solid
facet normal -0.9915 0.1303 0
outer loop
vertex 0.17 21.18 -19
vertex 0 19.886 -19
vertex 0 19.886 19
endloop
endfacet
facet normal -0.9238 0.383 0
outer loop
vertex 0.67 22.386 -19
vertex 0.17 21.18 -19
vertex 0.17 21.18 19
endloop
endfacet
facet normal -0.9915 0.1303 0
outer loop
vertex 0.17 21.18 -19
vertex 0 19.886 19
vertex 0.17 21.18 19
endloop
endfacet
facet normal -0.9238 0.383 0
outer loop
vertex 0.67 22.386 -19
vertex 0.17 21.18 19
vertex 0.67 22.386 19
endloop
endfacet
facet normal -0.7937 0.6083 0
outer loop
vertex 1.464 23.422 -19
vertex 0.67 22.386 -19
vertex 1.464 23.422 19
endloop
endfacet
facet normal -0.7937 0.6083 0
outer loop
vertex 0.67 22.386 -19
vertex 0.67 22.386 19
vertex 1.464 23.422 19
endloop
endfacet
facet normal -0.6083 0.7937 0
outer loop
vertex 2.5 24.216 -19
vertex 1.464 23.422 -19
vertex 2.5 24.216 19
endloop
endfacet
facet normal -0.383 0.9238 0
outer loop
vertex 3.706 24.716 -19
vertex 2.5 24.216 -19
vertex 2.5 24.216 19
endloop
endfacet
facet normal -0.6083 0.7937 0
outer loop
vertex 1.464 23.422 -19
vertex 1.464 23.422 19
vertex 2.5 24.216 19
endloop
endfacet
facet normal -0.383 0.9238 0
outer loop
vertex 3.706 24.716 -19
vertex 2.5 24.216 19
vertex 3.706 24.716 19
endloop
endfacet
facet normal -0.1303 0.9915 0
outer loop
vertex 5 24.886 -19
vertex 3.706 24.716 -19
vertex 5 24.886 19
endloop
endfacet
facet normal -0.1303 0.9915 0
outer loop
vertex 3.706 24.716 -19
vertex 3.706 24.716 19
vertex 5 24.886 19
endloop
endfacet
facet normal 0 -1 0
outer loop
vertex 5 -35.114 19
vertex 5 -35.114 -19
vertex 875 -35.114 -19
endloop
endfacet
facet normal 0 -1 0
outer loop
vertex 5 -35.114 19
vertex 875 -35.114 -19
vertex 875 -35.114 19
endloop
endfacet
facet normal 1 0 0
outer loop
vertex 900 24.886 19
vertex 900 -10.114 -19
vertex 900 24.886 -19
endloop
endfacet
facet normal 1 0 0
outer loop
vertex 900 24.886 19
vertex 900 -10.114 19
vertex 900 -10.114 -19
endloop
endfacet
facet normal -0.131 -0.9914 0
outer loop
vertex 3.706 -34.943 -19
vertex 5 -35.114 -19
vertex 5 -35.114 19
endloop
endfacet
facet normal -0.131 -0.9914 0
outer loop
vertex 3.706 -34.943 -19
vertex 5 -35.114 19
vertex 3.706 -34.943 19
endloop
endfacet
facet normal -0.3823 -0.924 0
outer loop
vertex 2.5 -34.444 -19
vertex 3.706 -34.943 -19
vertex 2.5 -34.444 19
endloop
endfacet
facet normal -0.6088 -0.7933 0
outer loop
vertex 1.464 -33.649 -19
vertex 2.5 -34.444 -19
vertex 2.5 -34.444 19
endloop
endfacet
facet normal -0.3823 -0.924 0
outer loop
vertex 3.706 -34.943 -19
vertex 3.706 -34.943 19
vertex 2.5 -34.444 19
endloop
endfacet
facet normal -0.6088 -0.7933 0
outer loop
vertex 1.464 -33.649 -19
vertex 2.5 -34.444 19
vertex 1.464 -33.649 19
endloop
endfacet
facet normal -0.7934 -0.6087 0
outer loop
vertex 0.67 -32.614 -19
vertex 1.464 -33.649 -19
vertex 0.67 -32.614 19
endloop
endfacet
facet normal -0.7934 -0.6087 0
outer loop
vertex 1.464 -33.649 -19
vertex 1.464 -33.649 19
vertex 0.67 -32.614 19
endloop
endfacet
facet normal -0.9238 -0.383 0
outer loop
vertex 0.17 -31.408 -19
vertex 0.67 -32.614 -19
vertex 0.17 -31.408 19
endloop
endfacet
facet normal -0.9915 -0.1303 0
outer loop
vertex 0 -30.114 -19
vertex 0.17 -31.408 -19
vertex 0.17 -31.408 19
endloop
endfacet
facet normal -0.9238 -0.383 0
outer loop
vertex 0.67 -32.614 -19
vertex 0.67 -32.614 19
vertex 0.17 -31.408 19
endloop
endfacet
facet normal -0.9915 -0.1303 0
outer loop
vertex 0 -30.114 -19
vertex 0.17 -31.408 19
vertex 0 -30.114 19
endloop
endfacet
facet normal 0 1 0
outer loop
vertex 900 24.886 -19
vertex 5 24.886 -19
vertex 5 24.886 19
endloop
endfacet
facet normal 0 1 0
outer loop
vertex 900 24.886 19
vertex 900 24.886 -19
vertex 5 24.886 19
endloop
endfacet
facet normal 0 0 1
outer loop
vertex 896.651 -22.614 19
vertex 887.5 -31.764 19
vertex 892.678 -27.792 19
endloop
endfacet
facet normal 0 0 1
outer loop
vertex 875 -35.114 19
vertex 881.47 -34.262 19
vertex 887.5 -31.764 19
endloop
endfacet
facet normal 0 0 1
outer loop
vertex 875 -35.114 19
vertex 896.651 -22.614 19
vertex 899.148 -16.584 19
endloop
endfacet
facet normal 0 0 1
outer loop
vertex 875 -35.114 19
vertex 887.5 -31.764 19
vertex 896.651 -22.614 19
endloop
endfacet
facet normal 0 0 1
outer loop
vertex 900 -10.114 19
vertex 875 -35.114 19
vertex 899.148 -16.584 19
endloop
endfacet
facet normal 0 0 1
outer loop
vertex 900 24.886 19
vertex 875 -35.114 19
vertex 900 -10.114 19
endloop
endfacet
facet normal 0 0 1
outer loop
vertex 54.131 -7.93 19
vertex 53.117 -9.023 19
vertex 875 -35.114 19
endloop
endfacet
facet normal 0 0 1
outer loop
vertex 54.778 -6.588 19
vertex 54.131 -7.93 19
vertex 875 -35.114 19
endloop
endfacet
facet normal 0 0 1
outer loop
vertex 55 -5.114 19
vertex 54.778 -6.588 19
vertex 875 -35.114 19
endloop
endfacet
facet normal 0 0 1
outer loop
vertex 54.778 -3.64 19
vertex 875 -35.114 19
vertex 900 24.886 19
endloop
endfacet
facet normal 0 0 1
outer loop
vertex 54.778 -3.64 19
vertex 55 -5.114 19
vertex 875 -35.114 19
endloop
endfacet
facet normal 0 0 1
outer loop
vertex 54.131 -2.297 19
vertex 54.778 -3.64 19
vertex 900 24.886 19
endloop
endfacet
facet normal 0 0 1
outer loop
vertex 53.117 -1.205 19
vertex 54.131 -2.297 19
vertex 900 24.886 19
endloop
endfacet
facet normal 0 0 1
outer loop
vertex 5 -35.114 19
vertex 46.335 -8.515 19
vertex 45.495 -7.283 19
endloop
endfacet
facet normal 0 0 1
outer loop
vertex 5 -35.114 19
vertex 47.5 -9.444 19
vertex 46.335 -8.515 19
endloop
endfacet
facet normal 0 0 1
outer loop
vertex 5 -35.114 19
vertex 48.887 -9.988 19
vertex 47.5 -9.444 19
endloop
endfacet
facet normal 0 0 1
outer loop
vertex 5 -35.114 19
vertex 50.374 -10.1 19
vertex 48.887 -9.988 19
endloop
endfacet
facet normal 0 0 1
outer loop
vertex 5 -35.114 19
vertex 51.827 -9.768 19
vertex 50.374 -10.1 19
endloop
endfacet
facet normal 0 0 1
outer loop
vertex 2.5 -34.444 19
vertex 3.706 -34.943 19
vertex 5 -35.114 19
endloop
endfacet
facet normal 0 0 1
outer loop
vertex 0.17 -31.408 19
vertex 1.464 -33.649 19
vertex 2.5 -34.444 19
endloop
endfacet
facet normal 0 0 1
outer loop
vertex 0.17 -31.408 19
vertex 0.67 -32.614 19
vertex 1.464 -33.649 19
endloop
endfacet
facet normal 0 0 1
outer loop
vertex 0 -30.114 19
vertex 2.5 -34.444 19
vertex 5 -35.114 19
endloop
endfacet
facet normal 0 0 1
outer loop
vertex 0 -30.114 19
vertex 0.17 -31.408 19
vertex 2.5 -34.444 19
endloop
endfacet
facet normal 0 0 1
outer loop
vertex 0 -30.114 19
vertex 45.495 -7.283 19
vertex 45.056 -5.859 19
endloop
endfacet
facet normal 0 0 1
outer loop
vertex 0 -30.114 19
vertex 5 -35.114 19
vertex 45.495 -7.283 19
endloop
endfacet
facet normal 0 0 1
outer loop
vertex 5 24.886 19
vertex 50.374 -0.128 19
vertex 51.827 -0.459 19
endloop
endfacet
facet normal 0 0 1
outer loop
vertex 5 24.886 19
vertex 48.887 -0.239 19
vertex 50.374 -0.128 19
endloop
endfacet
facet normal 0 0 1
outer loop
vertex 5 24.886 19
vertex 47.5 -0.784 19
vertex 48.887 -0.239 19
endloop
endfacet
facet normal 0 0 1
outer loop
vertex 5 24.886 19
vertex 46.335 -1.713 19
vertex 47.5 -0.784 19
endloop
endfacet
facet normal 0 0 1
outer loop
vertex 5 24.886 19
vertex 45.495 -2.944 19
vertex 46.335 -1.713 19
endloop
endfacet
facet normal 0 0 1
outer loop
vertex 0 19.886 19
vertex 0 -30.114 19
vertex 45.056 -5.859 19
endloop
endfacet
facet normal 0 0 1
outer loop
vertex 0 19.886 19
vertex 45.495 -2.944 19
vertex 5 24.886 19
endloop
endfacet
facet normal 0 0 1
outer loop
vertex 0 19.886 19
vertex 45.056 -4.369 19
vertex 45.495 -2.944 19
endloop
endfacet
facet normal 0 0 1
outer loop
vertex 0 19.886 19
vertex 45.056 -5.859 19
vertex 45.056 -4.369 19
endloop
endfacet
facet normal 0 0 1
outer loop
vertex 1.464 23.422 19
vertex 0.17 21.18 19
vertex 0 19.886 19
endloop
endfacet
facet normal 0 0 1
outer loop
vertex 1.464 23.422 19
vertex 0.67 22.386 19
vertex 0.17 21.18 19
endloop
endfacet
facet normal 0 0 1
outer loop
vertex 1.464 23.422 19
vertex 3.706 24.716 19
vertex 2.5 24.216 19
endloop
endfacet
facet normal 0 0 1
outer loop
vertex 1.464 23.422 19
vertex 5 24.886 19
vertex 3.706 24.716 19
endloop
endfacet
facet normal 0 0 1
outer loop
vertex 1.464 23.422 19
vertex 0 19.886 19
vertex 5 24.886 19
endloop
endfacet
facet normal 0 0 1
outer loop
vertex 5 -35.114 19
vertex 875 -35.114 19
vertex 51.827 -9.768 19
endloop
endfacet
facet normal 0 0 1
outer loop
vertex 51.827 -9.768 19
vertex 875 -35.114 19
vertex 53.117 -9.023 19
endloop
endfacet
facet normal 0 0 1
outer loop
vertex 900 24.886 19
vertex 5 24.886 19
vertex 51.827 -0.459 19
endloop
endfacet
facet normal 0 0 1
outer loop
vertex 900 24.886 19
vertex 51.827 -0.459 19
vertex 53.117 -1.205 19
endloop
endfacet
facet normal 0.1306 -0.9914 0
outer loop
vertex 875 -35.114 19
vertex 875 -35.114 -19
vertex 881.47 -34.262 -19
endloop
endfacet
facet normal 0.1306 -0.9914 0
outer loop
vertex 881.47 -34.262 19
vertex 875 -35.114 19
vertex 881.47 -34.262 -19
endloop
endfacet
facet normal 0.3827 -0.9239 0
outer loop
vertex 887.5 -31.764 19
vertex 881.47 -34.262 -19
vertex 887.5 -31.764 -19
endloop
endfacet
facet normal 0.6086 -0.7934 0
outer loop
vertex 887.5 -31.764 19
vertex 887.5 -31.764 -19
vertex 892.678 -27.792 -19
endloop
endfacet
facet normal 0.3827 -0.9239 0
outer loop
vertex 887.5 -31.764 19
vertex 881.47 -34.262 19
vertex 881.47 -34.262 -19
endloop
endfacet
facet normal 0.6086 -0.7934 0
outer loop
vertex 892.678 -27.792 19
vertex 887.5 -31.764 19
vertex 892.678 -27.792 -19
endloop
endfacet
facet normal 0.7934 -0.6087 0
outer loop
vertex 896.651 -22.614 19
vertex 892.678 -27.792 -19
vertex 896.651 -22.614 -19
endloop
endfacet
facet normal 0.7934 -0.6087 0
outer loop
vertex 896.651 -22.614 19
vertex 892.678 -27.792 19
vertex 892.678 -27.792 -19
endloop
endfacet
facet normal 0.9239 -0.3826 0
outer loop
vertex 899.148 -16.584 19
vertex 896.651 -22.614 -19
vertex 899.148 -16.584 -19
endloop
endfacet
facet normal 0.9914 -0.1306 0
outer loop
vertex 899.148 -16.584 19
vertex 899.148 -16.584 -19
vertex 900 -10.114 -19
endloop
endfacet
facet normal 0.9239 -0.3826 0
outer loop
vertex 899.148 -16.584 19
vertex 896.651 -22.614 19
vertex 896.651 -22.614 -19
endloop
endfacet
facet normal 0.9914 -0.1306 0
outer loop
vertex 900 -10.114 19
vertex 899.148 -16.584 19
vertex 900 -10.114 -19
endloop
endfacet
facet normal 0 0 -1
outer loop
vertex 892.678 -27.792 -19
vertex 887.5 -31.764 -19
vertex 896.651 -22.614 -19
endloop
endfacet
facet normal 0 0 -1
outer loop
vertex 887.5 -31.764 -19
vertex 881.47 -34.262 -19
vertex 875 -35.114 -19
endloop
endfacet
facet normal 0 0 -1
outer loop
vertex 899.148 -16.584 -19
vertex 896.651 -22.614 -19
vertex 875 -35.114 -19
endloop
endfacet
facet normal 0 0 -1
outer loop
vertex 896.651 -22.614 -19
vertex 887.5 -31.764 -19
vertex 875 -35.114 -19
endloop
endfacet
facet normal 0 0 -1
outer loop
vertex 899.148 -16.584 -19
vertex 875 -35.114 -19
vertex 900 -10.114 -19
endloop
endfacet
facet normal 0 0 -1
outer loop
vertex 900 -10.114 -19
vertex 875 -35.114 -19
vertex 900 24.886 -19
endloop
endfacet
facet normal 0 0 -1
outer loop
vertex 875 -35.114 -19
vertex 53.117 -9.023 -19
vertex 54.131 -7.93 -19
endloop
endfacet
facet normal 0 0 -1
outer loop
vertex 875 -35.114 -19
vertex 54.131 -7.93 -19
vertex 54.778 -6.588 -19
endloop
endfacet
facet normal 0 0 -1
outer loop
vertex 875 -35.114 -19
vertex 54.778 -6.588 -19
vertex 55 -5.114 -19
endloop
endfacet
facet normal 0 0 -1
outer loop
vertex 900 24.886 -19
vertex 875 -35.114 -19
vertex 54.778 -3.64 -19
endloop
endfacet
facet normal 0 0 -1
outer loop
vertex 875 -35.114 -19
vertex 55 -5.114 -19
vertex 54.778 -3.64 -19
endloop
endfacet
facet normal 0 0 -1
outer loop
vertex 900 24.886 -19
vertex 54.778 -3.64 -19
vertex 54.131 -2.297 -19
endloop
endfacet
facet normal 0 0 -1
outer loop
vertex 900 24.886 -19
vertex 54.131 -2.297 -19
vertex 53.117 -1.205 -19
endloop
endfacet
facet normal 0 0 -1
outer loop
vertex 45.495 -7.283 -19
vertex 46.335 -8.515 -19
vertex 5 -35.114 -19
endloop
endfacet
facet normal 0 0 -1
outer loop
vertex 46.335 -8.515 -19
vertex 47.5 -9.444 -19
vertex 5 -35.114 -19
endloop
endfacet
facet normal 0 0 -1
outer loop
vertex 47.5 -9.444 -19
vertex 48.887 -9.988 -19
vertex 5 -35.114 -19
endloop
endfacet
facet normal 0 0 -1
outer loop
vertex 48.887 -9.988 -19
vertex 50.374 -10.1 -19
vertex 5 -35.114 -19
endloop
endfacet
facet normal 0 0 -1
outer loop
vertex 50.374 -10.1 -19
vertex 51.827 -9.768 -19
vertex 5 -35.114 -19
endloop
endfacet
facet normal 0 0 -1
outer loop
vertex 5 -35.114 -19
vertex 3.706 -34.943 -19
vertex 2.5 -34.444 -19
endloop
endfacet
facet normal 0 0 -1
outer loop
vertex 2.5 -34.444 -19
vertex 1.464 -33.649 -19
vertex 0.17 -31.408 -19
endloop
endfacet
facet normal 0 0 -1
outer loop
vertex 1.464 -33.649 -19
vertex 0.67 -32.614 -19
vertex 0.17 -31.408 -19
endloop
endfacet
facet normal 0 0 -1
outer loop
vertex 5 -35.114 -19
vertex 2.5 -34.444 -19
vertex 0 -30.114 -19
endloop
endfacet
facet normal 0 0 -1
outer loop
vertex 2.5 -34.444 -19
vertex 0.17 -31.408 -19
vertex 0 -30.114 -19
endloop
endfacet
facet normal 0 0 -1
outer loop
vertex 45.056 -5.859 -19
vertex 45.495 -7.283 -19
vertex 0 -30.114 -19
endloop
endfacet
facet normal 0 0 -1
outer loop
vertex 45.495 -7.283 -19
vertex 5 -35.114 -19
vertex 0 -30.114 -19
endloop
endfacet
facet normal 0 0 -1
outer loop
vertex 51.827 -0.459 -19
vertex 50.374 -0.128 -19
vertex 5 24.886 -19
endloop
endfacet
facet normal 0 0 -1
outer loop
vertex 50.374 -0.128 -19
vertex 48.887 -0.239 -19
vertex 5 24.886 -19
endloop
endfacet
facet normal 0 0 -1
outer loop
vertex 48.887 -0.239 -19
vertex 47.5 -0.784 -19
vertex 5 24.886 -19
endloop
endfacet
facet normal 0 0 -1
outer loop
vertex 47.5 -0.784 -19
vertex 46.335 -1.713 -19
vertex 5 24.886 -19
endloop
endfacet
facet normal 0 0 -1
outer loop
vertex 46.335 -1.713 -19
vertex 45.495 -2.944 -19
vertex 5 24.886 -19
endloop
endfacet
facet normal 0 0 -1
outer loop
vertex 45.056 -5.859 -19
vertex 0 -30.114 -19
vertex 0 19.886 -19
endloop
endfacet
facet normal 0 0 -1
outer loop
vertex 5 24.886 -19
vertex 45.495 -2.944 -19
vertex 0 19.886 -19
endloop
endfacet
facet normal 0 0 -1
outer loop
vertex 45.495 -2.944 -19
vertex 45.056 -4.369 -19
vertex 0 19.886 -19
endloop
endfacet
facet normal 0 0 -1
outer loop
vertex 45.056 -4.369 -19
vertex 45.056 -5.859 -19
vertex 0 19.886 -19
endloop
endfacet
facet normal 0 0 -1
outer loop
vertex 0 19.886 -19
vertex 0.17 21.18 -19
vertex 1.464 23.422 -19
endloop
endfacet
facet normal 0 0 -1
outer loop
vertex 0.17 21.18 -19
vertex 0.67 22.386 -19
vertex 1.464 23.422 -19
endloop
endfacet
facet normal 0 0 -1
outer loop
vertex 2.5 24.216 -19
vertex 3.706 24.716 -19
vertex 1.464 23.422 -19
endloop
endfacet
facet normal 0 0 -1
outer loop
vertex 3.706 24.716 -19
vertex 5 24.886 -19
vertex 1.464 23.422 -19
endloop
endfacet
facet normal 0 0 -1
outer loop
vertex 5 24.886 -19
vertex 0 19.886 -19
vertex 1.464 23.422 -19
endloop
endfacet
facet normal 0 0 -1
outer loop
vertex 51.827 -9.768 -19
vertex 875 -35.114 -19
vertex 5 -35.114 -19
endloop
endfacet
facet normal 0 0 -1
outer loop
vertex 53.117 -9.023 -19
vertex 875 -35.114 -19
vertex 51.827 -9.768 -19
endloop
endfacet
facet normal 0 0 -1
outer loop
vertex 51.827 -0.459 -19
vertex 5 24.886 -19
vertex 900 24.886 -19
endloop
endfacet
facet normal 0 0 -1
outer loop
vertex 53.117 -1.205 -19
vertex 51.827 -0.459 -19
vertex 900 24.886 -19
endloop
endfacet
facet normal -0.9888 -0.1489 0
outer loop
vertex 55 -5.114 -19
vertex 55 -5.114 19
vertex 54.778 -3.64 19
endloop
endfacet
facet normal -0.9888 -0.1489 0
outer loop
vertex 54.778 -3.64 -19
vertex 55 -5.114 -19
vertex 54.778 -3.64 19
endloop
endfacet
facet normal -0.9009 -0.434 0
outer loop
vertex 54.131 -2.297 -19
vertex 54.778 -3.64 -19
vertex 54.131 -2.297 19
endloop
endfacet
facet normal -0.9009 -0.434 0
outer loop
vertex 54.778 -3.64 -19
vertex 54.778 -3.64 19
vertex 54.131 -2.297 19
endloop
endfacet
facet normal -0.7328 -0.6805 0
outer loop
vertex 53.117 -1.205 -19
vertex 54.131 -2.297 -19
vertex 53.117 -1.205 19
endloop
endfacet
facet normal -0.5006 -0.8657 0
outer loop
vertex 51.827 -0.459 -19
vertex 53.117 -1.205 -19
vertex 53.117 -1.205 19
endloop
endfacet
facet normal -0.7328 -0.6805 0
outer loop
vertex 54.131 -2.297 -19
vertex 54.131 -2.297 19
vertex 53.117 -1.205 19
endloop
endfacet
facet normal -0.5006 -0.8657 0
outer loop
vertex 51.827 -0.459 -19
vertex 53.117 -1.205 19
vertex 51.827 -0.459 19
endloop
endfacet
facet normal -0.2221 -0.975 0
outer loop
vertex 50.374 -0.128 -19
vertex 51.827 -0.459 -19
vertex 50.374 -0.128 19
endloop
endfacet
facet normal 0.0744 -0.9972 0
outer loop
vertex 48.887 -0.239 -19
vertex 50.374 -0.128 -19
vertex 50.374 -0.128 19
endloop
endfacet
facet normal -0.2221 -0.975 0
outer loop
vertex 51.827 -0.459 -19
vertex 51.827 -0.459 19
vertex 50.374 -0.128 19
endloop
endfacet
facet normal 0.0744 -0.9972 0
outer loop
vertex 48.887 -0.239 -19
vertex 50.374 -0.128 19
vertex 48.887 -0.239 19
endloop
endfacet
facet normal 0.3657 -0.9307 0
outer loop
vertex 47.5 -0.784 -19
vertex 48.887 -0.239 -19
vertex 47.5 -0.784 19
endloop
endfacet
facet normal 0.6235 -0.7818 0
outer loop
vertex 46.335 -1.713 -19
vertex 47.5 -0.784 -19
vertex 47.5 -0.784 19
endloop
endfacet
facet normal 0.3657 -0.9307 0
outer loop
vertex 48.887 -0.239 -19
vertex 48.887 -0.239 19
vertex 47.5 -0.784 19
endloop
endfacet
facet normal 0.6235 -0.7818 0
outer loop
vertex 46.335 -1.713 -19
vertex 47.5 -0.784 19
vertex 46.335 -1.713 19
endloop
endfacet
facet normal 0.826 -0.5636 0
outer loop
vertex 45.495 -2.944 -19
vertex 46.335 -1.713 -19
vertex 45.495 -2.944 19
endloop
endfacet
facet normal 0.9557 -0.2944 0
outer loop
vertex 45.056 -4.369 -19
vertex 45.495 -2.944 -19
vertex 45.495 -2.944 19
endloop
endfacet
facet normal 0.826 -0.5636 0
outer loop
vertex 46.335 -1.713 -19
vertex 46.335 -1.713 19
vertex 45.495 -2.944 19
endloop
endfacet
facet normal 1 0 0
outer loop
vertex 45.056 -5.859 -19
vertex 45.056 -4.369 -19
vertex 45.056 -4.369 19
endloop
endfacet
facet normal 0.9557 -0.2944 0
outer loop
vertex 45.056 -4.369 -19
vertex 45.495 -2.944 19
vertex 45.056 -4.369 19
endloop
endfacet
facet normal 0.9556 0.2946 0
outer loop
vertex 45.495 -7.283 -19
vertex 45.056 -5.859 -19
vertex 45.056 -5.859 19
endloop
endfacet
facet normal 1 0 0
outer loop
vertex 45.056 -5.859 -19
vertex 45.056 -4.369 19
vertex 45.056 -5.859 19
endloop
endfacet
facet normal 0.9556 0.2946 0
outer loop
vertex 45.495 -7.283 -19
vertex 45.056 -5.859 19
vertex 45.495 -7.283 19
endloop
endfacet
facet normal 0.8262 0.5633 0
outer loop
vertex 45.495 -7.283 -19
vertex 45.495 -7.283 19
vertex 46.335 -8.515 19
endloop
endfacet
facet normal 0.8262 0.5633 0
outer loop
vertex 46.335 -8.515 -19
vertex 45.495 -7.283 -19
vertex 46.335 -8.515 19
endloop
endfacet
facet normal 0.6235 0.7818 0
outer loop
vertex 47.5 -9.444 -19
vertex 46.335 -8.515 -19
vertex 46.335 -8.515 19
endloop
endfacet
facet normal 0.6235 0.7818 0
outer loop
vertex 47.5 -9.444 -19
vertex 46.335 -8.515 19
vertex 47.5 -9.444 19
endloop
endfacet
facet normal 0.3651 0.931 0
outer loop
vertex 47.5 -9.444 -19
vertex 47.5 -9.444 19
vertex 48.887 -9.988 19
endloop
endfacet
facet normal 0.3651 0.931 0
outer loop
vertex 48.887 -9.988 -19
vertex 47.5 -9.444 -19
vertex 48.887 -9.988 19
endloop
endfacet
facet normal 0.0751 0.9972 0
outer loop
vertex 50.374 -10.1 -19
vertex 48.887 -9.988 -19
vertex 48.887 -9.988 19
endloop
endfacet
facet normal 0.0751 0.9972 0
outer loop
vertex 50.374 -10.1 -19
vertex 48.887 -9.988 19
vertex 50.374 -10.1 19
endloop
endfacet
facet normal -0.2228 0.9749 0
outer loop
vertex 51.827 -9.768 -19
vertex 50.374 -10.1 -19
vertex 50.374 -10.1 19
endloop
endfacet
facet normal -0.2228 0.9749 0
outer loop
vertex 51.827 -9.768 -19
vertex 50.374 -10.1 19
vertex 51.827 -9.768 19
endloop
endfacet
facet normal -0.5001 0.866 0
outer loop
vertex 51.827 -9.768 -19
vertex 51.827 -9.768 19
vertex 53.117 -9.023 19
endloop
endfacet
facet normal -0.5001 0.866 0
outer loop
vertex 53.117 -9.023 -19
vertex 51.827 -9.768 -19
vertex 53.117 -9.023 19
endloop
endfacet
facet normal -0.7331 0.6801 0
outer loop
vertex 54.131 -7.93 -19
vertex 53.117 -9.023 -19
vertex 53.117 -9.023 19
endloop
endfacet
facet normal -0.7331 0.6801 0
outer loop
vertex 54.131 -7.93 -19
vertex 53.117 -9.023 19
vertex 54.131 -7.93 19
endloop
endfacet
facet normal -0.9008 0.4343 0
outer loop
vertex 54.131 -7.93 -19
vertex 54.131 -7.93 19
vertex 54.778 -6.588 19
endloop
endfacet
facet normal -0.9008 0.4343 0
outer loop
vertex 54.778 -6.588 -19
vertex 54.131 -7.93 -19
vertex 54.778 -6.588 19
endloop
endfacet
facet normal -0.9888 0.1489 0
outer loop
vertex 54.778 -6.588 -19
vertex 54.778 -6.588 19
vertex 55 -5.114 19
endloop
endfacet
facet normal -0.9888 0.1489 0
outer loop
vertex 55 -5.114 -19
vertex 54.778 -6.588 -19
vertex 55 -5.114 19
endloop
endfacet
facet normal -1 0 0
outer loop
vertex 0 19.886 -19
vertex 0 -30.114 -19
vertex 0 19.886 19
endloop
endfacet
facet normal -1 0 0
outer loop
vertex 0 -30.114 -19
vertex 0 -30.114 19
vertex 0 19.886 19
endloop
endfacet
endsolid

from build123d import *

# Parameters (mm, degrees)
F0_W     = 60
F0_H     = 38
F1_DEPTH = 900
F2_R     = 25
F3_R     = 5
F4_R     = 5
F5_DEPTH = 38.001


with BuildPart() as f1:
    # F0 (on Right) → F1 (new body)
    with BuildSketch(Plane.YZ):
        with Locations((-5.113847, 0)):
            Rectangle(F0_W, F0_H)
    extrude(amount=F1_DEPTH)

    # F2
    f2_edges = [f1.edges().sort_by_distance(p)[0] for p in [
        (900, -35.113847, 0),
    ]]
    fillet(f2_edges, radius=F2_R)

    # F3
    f3_edges = [f1.edges().sort_by_distance(p)[0] for p in [
        (0, 24.886153, 0),
        (0, -35.113847, 0),
    ]]
    fillet(f3_edges, radius=F3_R)

    # F4 (on face) → F5 (cut, through all)
    with BuildSketch(Plane.XY.offset(19)):
        with Locations((50, -5.113847)):
            Circle(F4_R)
    extrude(amount=-F5_DEPTH, mode=Mode.SUBTRACT)


solid = f1.part
